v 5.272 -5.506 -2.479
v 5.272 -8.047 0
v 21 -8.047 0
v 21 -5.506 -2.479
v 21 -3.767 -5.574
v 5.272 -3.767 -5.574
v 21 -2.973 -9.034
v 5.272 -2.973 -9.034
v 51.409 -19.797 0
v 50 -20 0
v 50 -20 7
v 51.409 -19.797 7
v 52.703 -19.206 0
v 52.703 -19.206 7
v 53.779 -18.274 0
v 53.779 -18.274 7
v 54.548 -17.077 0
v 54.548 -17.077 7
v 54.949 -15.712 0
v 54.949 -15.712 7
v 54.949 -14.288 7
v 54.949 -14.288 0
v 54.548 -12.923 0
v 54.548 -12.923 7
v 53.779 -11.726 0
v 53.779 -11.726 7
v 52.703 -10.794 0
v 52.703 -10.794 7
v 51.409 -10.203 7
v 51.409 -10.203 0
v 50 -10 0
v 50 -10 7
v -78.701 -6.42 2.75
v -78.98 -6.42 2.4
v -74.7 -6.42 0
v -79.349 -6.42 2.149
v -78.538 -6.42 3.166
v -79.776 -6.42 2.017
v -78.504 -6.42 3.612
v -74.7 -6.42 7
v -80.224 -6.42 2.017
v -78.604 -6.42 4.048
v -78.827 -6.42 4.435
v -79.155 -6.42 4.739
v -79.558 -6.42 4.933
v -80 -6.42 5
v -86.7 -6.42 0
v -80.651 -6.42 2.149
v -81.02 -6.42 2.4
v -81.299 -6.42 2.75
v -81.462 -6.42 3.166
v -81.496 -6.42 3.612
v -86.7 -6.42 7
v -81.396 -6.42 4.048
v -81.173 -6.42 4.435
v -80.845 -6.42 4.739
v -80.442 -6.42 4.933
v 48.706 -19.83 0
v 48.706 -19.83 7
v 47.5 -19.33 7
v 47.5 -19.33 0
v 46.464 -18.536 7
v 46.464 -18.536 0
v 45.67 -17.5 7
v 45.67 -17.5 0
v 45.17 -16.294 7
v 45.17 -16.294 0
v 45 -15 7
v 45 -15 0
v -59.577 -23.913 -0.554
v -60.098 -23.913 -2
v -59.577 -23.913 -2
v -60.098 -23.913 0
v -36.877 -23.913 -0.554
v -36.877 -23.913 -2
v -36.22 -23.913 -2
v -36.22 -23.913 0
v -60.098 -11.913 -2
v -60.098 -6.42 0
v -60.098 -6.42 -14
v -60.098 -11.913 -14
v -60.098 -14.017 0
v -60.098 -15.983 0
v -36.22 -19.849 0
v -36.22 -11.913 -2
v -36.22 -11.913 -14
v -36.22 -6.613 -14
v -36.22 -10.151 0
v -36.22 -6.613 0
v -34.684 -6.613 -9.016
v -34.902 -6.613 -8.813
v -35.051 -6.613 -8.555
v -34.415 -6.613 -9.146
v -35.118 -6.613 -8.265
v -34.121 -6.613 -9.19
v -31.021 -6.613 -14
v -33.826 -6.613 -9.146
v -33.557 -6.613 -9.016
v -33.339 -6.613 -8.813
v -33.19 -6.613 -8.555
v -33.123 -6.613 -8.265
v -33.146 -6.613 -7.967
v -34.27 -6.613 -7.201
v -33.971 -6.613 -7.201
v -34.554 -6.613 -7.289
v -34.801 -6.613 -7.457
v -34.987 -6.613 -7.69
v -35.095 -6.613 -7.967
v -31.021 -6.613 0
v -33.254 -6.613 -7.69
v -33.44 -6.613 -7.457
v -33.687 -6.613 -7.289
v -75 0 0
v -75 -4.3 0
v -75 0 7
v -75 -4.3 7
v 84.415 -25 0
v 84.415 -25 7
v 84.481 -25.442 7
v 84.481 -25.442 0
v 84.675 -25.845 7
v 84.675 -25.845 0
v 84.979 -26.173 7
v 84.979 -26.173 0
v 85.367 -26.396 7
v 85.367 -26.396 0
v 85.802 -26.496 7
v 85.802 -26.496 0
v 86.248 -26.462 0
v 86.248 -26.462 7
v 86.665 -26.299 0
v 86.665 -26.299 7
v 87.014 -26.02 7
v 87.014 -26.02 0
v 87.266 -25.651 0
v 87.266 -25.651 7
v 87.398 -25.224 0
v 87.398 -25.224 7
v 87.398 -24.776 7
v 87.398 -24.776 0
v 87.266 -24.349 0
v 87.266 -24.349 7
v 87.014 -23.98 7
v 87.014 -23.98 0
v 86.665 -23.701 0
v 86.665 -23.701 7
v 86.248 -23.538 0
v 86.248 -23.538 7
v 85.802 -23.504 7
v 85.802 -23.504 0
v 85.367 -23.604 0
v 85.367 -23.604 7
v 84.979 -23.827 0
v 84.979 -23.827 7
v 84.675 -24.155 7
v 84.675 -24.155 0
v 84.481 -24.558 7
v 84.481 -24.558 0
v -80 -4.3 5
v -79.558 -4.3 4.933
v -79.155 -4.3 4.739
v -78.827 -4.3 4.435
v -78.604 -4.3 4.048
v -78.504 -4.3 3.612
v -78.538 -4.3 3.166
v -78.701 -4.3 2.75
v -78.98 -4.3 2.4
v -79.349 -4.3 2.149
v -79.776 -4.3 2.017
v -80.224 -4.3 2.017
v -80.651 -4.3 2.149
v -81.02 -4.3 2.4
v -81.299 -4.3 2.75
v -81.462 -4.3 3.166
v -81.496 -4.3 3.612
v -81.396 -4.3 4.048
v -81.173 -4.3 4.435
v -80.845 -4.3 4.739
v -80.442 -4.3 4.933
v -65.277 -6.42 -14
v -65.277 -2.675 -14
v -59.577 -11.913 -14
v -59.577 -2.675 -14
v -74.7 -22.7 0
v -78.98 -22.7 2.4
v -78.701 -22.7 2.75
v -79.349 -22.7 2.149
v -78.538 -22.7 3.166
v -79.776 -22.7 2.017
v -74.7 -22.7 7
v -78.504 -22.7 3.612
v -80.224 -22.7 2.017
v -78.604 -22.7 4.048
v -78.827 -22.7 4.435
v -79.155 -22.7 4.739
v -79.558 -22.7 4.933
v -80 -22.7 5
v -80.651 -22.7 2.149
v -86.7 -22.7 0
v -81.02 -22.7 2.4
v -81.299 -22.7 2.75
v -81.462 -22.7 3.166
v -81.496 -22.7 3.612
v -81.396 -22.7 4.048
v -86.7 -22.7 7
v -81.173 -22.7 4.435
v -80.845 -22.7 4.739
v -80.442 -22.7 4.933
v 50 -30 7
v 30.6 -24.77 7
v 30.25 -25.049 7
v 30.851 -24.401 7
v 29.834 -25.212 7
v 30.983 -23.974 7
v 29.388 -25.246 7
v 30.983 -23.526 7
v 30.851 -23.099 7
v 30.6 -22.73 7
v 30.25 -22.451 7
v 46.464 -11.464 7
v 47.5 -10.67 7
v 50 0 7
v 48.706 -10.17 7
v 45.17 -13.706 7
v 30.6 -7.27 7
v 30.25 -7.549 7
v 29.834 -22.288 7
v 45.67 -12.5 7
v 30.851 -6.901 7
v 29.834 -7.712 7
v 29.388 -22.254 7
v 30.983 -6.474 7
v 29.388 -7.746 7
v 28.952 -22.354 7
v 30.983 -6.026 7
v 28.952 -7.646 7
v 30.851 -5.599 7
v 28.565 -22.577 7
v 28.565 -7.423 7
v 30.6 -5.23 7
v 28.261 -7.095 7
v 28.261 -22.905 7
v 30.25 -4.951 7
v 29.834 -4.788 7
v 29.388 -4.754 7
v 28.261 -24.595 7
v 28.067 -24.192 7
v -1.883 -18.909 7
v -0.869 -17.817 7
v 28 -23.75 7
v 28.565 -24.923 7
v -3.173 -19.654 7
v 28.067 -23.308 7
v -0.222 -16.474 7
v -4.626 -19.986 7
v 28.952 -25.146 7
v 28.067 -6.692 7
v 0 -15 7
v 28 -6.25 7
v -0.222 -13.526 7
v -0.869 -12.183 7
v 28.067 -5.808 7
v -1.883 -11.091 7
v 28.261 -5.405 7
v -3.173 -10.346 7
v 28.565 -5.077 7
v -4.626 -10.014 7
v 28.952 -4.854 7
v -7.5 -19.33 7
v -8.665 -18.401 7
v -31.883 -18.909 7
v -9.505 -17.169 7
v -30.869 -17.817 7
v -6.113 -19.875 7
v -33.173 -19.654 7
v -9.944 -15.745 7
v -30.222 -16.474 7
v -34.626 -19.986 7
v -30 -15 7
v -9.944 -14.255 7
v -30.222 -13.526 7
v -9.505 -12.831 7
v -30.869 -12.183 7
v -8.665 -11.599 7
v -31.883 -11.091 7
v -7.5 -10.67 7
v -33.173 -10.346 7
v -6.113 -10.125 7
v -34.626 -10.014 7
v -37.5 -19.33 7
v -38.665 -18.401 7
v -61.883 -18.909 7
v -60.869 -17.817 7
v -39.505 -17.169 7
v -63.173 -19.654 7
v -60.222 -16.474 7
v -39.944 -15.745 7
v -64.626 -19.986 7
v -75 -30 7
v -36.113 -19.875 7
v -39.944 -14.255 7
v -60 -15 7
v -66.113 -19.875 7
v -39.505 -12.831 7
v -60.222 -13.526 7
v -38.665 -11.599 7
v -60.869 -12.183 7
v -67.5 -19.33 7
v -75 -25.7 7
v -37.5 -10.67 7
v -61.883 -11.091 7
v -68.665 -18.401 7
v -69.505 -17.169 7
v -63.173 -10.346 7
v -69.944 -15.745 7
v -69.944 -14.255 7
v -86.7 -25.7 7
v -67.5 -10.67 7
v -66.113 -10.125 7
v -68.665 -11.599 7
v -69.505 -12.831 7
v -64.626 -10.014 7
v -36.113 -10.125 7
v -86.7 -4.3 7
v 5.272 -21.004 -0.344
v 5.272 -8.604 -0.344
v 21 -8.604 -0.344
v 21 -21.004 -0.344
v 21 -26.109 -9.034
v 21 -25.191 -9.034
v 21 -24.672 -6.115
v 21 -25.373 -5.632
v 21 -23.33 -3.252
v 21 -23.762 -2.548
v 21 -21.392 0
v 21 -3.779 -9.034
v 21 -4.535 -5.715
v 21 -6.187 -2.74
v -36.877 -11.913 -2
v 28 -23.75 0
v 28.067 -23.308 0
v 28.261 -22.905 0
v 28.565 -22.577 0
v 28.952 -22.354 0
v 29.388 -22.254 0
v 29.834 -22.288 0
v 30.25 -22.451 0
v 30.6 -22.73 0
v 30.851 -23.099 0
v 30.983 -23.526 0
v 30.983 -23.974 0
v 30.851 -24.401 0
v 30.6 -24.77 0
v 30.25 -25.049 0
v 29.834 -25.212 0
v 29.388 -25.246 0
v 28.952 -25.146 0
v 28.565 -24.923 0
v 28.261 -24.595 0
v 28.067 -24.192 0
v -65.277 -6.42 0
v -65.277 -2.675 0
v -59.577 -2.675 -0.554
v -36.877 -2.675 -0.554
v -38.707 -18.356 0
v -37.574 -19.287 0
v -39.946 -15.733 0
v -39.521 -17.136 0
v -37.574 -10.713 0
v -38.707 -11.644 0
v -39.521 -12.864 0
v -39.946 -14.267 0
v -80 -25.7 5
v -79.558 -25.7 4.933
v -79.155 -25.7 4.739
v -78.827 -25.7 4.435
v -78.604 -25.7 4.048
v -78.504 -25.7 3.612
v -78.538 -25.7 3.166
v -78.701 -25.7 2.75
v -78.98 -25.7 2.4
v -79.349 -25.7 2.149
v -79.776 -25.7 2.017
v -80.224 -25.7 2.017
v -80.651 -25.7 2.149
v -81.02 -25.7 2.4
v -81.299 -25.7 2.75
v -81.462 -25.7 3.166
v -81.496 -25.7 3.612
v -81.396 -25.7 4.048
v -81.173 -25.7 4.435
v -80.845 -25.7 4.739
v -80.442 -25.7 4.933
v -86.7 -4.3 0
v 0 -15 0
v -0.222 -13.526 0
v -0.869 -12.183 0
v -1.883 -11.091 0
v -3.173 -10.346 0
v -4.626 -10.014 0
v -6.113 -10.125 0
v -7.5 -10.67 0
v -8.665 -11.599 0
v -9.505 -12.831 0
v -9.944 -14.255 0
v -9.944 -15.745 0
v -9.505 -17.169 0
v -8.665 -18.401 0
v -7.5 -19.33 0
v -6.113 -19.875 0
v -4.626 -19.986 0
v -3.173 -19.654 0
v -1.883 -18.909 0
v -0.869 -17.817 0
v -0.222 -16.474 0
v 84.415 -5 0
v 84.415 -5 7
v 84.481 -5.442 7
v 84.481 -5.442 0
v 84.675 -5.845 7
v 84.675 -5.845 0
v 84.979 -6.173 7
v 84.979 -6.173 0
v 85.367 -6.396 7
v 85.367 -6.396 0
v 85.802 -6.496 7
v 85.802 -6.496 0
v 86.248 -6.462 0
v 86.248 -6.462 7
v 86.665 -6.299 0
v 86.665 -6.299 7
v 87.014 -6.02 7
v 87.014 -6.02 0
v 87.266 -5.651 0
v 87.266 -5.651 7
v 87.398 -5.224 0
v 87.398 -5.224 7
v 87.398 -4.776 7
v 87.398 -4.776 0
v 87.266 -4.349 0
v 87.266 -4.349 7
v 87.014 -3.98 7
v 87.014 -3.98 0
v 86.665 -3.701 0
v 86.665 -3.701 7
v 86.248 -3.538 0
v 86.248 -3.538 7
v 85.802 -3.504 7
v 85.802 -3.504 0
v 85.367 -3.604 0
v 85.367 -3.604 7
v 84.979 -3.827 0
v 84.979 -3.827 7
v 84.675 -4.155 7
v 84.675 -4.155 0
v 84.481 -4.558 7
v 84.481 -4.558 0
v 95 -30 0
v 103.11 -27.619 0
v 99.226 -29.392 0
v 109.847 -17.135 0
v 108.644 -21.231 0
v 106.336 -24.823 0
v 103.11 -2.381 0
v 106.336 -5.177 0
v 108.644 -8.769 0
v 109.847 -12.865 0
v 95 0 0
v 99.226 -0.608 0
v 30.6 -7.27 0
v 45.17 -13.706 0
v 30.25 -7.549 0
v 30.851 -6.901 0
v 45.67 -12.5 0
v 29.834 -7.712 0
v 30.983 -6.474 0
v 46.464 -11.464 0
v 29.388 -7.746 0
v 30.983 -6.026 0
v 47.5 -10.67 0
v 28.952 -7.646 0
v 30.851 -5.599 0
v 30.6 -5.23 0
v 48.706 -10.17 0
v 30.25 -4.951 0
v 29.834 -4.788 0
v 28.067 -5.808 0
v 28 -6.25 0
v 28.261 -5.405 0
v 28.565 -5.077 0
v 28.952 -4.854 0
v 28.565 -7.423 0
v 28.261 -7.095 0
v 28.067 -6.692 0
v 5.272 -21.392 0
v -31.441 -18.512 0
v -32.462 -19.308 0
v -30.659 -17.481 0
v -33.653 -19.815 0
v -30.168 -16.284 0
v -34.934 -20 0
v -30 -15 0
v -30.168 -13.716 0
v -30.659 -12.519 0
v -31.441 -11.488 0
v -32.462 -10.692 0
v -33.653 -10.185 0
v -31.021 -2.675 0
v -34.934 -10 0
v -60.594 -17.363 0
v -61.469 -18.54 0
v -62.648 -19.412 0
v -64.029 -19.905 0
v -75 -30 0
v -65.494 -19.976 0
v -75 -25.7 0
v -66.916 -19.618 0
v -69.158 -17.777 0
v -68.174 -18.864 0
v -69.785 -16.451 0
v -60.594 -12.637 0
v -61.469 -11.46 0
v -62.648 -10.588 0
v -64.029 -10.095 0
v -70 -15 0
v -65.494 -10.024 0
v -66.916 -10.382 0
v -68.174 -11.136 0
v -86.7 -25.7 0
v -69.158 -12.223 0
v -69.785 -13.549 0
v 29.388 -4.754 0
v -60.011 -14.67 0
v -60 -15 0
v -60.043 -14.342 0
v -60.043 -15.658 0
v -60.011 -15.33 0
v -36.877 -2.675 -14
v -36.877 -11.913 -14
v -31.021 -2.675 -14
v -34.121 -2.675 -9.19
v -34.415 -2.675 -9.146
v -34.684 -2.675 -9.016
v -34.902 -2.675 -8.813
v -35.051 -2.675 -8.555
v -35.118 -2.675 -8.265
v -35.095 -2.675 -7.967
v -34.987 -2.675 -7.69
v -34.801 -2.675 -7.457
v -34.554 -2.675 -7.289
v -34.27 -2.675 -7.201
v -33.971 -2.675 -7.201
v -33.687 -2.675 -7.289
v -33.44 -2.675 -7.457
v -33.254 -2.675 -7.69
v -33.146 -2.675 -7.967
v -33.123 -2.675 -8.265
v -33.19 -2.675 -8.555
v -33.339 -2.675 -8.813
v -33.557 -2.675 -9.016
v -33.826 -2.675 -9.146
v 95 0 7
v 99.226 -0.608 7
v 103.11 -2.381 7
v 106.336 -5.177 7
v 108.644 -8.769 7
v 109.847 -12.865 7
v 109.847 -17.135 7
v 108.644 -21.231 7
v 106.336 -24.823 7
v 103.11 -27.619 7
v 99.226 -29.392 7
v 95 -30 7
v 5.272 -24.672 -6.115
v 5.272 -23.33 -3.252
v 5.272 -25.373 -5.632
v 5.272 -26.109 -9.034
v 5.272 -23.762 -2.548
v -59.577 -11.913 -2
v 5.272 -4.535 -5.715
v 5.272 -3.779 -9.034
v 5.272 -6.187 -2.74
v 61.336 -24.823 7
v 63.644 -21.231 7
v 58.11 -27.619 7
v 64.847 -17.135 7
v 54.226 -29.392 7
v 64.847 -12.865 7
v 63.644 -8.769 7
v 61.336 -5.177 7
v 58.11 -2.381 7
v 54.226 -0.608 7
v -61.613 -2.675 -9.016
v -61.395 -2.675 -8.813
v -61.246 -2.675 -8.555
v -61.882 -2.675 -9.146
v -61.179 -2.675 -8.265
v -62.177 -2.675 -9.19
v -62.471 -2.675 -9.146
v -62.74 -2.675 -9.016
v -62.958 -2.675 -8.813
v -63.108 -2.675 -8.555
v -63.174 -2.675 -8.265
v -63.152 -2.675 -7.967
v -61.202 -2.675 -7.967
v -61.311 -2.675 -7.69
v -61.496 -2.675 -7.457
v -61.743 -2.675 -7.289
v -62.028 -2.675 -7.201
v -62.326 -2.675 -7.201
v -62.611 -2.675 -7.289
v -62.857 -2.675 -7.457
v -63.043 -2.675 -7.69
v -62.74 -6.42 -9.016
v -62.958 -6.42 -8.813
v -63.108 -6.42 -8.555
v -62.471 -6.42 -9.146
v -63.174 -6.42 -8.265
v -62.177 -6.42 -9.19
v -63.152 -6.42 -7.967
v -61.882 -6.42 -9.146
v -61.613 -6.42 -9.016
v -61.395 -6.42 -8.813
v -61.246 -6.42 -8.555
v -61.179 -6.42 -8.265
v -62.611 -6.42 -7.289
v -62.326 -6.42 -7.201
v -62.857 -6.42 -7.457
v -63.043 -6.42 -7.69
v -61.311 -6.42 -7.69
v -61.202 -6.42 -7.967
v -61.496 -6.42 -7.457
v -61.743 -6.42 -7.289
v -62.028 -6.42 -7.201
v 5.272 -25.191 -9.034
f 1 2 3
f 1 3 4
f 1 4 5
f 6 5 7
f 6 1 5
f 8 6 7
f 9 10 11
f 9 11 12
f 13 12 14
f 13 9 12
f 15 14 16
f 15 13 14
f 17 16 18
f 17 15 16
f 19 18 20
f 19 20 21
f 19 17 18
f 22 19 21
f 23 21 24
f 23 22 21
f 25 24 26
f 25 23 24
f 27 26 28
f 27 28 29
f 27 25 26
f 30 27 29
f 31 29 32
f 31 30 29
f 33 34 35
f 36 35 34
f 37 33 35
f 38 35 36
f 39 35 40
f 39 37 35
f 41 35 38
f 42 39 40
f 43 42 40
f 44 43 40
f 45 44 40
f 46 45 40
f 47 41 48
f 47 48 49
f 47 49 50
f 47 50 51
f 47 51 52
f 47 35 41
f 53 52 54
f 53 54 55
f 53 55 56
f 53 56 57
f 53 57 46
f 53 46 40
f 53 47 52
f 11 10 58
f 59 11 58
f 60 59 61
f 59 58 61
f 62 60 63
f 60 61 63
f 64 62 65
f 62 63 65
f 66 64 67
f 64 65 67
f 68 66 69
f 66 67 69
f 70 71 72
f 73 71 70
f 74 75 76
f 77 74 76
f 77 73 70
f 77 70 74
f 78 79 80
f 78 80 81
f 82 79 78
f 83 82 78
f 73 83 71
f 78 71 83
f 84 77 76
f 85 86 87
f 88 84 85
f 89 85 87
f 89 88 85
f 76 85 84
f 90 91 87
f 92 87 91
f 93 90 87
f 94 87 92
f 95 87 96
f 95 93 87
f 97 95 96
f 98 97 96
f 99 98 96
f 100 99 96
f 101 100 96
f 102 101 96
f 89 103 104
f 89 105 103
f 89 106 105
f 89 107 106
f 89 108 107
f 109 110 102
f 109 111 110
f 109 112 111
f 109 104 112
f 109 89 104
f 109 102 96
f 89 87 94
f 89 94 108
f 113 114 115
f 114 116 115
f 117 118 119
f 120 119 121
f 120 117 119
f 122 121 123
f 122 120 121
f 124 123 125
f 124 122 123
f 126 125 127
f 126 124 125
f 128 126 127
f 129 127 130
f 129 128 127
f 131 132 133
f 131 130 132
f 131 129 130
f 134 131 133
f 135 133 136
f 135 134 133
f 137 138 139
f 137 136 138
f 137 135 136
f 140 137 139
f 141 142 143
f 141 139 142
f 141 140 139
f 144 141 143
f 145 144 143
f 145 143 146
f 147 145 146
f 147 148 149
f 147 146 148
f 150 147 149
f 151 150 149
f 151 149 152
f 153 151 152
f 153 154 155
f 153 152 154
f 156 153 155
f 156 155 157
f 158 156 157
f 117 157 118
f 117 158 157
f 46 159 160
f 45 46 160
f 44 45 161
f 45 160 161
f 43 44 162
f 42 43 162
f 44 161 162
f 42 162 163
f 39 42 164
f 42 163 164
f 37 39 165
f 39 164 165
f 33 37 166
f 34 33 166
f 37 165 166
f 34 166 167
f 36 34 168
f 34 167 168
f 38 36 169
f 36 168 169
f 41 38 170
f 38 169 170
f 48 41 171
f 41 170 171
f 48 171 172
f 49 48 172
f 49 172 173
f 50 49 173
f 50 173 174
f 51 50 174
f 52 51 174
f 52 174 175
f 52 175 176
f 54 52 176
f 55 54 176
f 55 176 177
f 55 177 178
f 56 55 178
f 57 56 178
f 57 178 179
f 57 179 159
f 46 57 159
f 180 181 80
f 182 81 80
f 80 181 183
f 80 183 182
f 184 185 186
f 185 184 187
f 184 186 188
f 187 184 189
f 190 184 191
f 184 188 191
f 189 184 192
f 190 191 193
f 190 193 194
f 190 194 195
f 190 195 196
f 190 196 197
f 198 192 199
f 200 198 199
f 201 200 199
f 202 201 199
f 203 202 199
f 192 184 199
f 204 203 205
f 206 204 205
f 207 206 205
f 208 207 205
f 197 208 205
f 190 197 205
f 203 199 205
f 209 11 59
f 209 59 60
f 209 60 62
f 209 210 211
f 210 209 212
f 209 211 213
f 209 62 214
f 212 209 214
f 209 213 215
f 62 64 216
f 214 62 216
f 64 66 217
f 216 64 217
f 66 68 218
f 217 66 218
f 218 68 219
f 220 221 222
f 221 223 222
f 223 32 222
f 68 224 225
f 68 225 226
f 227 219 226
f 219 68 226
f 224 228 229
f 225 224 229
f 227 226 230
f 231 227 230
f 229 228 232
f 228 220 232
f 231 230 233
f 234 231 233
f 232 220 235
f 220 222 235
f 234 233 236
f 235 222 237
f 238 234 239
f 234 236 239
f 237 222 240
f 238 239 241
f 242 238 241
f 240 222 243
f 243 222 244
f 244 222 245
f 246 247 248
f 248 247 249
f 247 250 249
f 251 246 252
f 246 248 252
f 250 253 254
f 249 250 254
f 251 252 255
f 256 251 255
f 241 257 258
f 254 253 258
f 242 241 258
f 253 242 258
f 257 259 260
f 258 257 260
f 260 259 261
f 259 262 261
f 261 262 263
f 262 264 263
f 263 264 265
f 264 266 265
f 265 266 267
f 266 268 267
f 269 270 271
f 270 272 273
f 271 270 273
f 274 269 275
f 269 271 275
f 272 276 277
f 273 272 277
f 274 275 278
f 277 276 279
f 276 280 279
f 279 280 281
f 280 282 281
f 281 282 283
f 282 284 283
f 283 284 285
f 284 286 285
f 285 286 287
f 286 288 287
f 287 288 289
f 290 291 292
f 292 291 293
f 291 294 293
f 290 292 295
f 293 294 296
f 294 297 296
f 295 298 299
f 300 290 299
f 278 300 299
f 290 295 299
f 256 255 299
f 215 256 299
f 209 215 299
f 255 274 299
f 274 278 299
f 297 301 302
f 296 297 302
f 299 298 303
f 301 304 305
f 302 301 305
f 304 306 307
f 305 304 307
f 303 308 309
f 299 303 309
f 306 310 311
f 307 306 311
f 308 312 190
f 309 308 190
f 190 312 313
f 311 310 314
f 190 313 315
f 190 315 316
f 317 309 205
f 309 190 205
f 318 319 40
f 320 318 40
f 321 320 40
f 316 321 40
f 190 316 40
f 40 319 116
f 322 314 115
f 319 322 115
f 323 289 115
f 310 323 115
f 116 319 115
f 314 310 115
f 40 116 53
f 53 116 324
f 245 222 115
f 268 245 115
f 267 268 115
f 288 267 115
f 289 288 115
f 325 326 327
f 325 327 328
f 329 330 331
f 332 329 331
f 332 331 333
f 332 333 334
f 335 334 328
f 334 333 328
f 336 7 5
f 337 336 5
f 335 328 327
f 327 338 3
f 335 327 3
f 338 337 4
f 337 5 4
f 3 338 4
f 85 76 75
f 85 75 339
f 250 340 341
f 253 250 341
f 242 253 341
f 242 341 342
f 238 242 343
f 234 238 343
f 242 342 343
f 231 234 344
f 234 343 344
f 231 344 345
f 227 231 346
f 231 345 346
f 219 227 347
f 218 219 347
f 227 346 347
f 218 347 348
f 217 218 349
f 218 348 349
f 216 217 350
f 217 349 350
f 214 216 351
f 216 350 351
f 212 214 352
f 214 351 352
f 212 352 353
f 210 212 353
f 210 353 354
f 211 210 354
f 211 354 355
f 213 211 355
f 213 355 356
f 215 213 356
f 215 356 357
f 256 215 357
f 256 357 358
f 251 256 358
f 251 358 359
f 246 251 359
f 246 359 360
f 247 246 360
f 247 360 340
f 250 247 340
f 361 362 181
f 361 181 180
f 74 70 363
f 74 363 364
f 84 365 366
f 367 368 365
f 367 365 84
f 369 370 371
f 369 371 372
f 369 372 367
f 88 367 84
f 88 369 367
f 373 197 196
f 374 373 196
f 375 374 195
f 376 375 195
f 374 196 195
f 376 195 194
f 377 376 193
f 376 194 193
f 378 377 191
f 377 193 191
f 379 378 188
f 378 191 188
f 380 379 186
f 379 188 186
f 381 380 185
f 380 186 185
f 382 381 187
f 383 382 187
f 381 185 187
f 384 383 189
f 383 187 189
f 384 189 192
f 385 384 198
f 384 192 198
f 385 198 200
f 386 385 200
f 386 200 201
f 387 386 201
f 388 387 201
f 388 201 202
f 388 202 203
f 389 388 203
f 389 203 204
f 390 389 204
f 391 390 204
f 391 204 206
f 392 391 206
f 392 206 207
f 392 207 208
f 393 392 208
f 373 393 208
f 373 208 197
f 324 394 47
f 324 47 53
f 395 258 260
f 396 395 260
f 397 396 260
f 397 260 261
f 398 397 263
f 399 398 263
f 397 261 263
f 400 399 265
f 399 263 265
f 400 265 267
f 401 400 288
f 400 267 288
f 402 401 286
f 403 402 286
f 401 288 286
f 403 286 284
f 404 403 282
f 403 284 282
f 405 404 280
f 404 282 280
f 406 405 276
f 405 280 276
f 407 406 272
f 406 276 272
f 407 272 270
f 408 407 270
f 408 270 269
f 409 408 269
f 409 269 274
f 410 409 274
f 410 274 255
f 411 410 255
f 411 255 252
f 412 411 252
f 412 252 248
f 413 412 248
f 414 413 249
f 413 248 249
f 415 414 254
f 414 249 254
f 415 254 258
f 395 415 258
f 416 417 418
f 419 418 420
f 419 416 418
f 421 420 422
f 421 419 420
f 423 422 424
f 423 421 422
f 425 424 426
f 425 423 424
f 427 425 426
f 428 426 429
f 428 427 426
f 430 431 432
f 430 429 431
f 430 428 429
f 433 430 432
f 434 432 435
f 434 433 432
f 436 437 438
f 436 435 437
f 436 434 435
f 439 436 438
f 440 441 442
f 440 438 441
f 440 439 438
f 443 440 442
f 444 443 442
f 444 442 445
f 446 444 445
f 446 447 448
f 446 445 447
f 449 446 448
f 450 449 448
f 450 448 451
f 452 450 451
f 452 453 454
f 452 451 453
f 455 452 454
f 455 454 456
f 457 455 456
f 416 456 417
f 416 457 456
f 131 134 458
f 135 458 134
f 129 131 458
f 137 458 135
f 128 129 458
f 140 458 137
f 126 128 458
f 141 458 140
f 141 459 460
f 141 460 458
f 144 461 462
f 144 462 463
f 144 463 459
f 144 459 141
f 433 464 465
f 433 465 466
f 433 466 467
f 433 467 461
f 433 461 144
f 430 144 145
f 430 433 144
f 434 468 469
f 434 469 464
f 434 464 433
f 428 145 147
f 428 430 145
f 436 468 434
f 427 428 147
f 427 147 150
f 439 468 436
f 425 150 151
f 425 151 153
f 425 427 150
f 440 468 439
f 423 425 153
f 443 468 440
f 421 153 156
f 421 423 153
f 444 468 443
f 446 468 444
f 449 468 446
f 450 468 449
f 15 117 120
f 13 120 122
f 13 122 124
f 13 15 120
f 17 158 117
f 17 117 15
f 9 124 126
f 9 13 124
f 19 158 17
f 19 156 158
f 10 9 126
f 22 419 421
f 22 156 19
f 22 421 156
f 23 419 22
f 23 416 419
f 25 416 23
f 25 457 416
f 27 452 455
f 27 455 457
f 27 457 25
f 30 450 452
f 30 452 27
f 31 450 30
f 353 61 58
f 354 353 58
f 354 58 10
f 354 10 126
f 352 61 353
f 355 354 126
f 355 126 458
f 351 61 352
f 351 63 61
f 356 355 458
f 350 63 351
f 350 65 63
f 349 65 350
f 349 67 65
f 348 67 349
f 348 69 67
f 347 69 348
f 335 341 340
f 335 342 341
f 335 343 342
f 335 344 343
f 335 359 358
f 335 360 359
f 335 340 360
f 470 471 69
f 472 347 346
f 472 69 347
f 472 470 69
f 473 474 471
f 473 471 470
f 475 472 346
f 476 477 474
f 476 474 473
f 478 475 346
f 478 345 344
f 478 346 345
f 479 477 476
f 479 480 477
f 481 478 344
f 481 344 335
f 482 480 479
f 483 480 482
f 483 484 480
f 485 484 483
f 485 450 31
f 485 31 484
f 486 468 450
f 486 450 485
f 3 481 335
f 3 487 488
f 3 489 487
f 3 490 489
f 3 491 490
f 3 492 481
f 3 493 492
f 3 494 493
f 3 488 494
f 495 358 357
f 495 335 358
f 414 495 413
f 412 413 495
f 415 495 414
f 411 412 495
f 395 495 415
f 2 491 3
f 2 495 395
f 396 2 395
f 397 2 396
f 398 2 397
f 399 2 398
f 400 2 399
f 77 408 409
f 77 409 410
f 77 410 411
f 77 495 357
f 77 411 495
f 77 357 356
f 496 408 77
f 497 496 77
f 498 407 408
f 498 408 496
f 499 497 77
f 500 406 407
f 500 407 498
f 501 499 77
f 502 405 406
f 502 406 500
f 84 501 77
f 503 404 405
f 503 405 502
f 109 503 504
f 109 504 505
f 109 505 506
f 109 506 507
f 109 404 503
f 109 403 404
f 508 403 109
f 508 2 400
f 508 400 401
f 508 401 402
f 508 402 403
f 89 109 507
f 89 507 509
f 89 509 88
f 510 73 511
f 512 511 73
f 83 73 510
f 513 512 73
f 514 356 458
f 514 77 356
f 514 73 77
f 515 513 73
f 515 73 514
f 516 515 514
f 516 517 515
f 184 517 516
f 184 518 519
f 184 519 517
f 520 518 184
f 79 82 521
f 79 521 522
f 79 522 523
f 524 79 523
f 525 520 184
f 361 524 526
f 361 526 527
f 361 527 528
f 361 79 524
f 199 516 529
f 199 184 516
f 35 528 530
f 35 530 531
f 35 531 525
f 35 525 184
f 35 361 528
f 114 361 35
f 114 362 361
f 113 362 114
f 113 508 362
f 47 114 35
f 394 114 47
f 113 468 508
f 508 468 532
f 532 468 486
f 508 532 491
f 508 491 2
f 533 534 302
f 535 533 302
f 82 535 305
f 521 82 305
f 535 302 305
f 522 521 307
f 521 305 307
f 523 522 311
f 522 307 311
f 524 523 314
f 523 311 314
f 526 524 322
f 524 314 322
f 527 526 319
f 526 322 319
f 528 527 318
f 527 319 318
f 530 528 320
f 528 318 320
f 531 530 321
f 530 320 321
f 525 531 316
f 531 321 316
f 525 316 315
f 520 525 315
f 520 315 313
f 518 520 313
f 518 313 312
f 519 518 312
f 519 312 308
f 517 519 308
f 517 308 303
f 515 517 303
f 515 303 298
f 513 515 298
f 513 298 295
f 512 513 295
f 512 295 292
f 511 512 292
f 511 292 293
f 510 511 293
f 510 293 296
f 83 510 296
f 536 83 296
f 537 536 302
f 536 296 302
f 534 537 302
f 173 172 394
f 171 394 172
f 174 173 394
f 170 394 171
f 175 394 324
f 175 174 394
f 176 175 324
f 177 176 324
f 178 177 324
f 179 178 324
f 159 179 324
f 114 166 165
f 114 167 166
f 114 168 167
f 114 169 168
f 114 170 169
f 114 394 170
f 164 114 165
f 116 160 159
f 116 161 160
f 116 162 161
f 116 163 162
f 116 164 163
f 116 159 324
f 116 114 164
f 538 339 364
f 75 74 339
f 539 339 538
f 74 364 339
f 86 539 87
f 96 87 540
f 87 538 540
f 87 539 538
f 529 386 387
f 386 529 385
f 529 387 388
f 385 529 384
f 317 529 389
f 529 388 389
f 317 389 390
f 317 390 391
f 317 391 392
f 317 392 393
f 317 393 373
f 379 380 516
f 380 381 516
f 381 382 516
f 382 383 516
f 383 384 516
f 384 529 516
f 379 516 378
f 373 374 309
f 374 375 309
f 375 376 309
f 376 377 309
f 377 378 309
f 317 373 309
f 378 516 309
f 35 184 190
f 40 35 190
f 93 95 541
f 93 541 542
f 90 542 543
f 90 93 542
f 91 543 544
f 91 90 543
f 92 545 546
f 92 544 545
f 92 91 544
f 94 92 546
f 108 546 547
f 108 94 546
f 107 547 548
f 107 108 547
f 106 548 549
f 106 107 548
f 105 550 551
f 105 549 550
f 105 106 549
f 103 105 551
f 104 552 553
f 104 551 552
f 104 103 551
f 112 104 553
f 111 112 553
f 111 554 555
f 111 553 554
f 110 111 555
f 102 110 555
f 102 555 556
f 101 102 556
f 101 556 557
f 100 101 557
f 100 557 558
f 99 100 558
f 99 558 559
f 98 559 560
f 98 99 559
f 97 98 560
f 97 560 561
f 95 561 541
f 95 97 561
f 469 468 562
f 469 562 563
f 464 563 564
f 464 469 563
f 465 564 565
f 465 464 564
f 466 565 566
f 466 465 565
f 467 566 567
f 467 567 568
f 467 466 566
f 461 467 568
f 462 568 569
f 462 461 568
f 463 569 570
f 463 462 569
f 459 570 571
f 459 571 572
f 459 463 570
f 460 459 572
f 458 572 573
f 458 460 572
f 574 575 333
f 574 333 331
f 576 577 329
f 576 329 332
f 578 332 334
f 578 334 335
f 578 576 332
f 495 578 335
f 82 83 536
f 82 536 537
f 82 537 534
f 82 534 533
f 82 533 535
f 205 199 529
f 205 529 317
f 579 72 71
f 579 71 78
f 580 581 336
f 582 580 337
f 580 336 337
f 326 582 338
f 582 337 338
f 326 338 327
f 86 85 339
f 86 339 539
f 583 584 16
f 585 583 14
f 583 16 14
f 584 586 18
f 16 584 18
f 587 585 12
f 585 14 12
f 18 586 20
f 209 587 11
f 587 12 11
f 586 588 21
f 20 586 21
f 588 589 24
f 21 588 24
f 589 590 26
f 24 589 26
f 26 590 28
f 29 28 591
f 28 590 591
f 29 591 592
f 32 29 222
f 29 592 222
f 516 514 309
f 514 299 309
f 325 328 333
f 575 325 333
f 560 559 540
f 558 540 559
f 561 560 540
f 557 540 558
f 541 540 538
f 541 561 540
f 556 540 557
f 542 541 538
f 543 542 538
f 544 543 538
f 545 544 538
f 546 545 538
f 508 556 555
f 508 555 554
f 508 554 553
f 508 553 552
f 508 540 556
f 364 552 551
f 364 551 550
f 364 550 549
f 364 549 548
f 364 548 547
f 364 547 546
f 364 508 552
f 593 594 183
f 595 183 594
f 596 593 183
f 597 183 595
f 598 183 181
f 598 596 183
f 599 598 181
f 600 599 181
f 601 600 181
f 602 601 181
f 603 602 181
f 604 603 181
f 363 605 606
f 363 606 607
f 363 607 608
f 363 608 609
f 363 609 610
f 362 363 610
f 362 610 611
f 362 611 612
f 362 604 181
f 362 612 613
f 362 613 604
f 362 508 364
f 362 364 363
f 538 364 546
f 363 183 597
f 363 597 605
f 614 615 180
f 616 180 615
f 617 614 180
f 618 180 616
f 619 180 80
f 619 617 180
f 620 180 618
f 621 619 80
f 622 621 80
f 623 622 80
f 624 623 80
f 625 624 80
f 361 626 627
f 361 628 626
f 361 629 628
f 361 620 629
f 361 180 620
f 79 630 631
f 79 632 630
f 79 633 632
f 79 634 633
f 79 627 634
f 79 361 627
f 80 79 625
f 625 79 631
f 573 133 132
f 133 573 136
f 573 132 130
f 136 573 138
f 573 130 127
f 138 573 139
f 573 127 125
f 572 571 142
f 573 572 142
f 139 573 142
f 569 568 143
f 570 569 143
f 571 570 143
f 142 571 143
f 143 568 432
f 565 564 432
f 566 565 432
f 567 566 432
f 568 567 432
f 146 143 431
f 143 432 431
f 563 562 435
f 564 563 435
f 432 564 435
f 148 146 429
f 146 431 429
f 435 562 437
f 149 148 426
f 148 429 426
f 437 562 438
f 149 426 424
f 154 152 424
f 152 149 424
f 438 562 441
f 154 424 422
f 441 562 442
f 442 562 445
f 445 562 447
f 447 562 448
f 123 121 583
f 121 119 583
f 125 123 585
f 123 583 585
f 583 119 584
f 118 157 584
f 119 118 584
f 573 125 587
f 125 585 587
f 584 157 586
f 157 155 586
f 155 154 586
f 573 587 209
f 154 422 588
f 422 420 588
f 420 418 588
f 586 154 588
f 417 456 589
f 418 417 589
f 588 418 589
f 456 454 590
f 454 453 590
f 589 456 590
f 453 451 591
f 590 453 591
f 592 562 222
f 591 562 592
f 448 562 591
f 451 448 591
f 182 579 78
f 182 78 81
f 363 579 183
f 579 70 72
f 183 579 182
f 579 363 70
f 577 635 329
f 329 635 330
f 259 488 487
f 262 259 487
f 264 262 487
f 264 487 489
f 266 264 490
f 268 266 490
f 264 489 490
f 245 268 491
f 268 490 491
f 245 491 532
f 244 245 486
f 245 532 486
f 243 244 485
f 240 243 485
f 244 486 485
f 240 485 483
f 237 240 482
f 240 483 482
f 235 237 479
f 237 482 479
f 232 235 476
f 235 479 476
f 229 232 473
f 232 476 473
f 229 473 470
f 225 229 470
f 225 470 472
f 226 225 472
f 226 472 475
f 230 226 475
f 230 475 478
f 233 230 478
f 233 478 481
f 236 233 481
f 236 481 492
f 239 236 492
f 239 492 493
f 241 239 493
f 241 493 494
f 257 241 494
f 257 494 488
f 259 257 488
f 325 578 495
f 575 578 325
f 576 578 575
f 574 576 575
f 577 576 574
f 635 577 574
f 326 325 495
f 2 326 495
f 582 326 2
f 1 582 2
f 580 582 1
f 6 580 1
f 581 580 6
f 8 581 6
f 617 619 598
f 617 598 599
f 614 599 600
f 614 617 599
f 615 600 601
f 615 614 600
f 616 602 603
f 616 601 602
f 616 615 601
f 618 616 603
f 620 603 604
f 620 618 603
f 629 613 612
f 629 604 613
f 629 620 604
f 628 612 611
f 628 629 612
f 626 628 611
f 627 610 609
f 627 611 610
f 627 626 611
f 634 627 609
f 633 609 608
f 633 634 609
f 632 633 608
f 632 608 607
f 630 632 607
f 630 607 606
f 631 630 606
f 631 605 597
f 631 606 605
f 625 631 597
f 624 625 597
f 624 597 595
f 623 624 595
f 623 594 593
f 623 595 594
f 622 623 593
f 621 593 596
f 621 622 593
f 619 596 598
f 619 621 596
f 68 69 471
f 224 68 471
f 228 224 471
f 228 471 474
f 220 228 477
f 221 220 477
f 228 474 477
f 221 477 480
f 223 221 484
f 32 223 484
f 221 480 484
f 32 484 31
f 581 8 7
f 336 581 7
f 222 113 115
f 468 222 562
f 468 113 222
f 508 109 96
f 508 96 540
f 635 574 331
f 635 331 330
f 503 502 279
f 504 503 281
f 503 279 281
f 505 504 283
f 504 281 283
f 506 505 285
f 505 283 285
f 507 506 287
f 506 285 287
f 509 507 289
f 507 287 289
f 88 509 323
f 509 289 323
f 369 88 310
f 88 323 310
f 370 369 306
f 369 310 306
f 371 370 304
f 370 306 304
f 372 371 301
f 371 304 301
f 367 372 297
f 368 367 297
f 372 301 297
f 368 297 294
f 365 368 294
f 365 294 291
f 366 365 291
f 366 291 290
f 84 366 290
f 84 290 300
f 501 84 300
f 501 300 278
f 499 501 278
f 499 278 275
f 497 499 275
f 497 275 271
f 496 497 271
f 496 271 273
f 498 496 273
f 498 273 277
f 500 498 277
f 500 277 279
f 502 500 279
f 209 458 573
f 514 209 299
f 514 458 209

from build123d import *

# Parameters (mm, degrees)
BOSS_EXTRUDE1_DEPTH      = 7
SKETCH2_R                = 5
CUT_EXTRUDE1_DEPTH       = 7
LPATTERN1_COUNT          = 7
LPATTERN1_PITCH          = 30
SKETCH6_R                = 5
CUT_EXTRUDE2_DEPTH       = 10
BOSS_EXTRUDE2_DEPTH      = 21
CUT_EXTRUDE3_DEPTH       = 21
CUT_EXTRUDE4_REACH       = 220.014
SKETCH9_R                = 1.5
CUT_EXTRUDE5_REACH       = 220.771
SKETCH10_W               = 5.271518542
SKETCH10_H               = 23.219312301
BOSS_EXTRUDE3_DEPTH      = 14
CUT_EXTRUDE6_DEPTH       = 1
CUT_EXTRUDE6_DEPTH_BACK  = 22
SKETCH12_W               = 22.7
SKETCH12_H               = 14.642587258
SKETCH12_H_2             = 12.3
CUT_EXTRUDE7_DEPTH       = 7
CUT_EXTRUDE7_DEPTH_BACK  = 7
SKETCH13_R               = 1
CUT_EXTRUDE8_REACH       = 184.393
SKETCH14_W               = 12
SKETCH14_H               = 12
CUT_EXTRUDE11_DEPTH      = 219.013742346
CUT_EXTRUDE11_DEPTH_BACK = 219.013742346
SKETCH16_W               = 140
SKETCH16_H               = 37.19308959
SKETCH17_W               = 7
SKETCH17_H               = 21.4
BOSS_EXTRUDE4_DEPTH      = 11.7
CUT_EXTRUDE12_REACH      = 94.641
SKETCH18_R               = 1.5
CUT_EXTRUDE13_REACH      = 95.925
SKETCH20_W               = 15.728481458
SKETCH20_H               = 11.090838969
SKETCH21_W               = 7
SKETCH21_H               = 16.279991403
CUT_EXTRUDE14_DEPTH      = 12
BOSS_EXTRUDE5_DEPTH      = 7
CUT_EXTRUDE15_DEPTH      = 116.935326799
CUT_EXTRUDE15_DEPTH_BACK = 7
SKETCH23_R               = 1.5


with BuildPart() as part:
    # Sketch1 → Boss-Extrude1 (new body)
    with BuildSketch(Plane.XY):
        with BuildLine():
            Line((-200, 0), (50, 0))
            ThreePointArc((50, 0), (65, -15), (50, -30))
            Line((50, -30), (-200, -30))
            ThreePointArc((-200, -30), (-215, -15), (-200, 0))
        make_face()
    extrude(amount=BOSS_EXTRUDE1_DEPTH)

    # Sketch2 → Cut-Extrude1 (cut)
    with BuildSketch(Plane.XY.offset(7)):
        with Locations((-185, -15)):
            Circle(SKETCH2_R)
    cut_extrude1 = extrude(amount=-CUT_EXTRUDE1_DEPTH, mode=Mode.SUBTRACT)

    # LPattern1: Cut-Extrude1 ×7
    with Locations(*[(i * LPATTERN1_PITCH, 0, 0) for i in range(1, LPATTERN1_COUNT)]):
        add(cut_extrude1, mode=Mode.SUBTRACT)

    # Sketch6 → Cut-Extrude2 (cut)
    with BuildSketch(Plane(origin=(0, 0, 0), x_dir=(-1, 0, 0), z_dir=(0, 0, -1))):
        with Locations((-50, -15)):
            Circle(SKETCH6_R)
    extrude(amount=-CUT_EXTRUDE2_DEPTH, mode=Mode.SUBTRACT)

    # Sketch7 → Boss-Extrude2 (add)
    with BuildSketch(Plane(origin=(0, 0, 0), x_dir=(0, 0, -1), z_dir=(1, 0, 0))):
        with BuildLine():
            Line((20.124409349, -8.046570755), (20.124409349, -21.391782887))
            ThreePointArc((20.124409349, -21.391782887), (10.062204675, -26.149434806), (0, -21.391782887))
            Line((0, -21.391782887), (0, -8.046570755))
            ThreePointArc((0, -8.046570755), (10.062204675, -2.930122505), (20.124409349, -8.046570755))
        make_face()
    extrude(amount=BOSS_EXTRUDE2_DEPTH)

    # Sketch8 → Cut-Extrude3 (cut)
    with BuildSketch(Plane(origin=(21, 0, 0), x_dir=(0, 0, -1), z_dir=(1, 0, 0))):
        with BuildLine():
            Line((0.343653188, -8.603738845), (0.343653188, -21.003738845))
            Line((0.343653188, -21.003738845), (3.251608919, -23.33010343))
            Line((3.251608919, -23.33010343), (6.11482687, -24.672236845))
            Line((6.11482687, -24.672236845), (10.141227113, -25.388041332))
            Line((10.141227113, -25.388041332), (14.122889575, -24.672236845))
            Line((14.122889575, -24.672236845), (17.165058648, -23.33010343))
            Line((17.165058648, -23.33010343), (19.670374355, -20.953281344))
            Line((19.670374355, -20.953281344), (19.670374355, -8.553281344))
            ThreePointArc((19.670374355, -8.553281344), (9.994377841, -3.738573545), (0.343653188, -8.603738845))
        make_face()
    extrude(amount=-CUT_EXTRUDE3_DEPTH, mode=Mode.SUBTRACT)

    # Sketch9 → Cut-Extrude4 (cut, up to next)
    with BuildSketch(Plane(origin=(0, 0, 0), x_dir=(-1, 0, 0), z_dir=(0, 0, -1)), mode=Mode.PRIVATE) as cut_extrude4_sk1:
        with Locations((-29.5, -6.25)):
            Circle(SKETCH9_R)
    cut_extrude4_tool1 = extrude(cut_extrude4_sk1.sketch, amount=-CUT_EXTRUDE4_REACH, mode=Mode.PRIVATE) & part.part
    # Sketch9 → Cut-Extrude4 (cut, up to next)
    with BuildSketch(Plane(origin=(0, 0, 0), x_dir=(-1, 0, 0), z_dir=(0, 0, -1)), mode=Mode.PRIVATE) as cut_extrude4_sk2:
        with Locations((-29.5, -23.75)):
            Circle(SKETCH9_R)
    cut_extrude4_tool2 = extrude(cut_extrude4_sk2.sketch, amount=-CUT_EXTRUDE4_REACH, mode=Mode.PRIVATE) & part.part
    add(cut_extrude4_tool1.solids().sort_by_distance((29.5, -6.25, 0))[0], mode=Mode.SUBTRACT)
    add(cut_extrude4_tool2.solids().sort_by_distance((29.5, -23.75, 0))[0], mode=Mode.SUBTRACT)

    # Cut-Extrude5: up to this face of the body (flat: up to its plane)
    cut_extrude5_end = Plane(part.part.faces().sort_by_distance((-78.33059512, -15.01080435, 0))[0])
    # Sketch10 → Cut-Extrude5 (cut, up to the picked face)
    with BuildSketch(Plane(origin=(0, 0, -20.124409349), x_dir=(-1, 0, 0), z_dir=(0, 0, -1)), mode=Mode.PRIVATE) as cut_extrude5_sk1:
        with Locations((-2.635759271, -14.539778656)):
            Rectangle(SKETCH10_W, SKETCH10_H)
    cut_extrude5_tool1 = split(extrude(cut_extrude5_sk1.sketch, amount=-CUT_EXTRUDE5_REACH, mode=Mode.PRIVATE), bisect_by=cut_extrude5_end, keep=Keep.BOTH, mode=Mode.PRIVATE)
    add(cut_extrude5_tool1.solids().sort_by(Axis((2.635759, -14.539779, -20.124409), (0, 0, 1)))[0], mode=Mode.SUBTRACT)

    # Sketch11 → Boss-Extrude3 (add)
    with BuildSketch(Plane(origin=(0, 0, 0), x_dir=(-1, 0, 0), z_dir=(0, 0, -1))):
        Polygon((60.097644306, -6.420008597), (60.097644306, -23.913431972), (36.21993437, -23.913431972), (36.21993437, -6.613282571), (31.020509523, -6.613282571), (31.020509523, -2.674883318), (65.276628567, -2.674883318), (65.276628567, -6.420008597), align=None)
        Polygon((193.975354243, -6.285954501), (193.975354243, -16.540829221), (170.097644306, -16.540829221), (170.097644306, -6.479228475), (164.898219459, -6.479228475), (164.898219459, -2.540829221), (199.154338504, -2.540829221), (199.154338504, -6.285954501), align=None)
    extrude(amount=BOSS_EXTRUDE3_DEPTH)

    # Sketch12 → Cut-Extrude6 (cut, two sides: drawn at the far end of the back side and taken through both)
    with BuildSketch(Plane(origin=(0, -2.674883318, 0), x_dir=(1, 0, 0), z_dir=(0, 1, 0)).offset(-CUT_EXTRUDE6_DEPTH_BACK)):
        with Locations((-48.226628567, 7.87504546)):
            Rectangle(SKETCH12_W, SKETCH12_H)
        with Locations((-182.104338504, 6.42306456)):
            Rectangle(SKETCH12_W, SKETCH12_H_2)
    extrude(amount=CUT_EXTRUDE6_DEPTH + CUT_EXTRUDE6_DEPTH_BACK, mode=Mode.SUBTRACT)

    # Sketch13 → Cut-Extrude7 (cut, two sides: drawn at the far end of the back side and taken through both)
    with BuildSketch(Plane(origin=(0, -2.674883318, 0), x_dir=(1, 0, 0), z_dir=(0, 1, 0)).offset(-CUT_EXTRUDE7_DEPTH_BACK)):
        with Locations(Location((-167.998219459, 8.19, 0), (0, 0, 90))):
            Circle(SKETCH13_R)
        with Locations(Location((-196.054338504, 8.19, 0), (0, 0, 90))):
            Circle(SKETCH13_R)
        with Locations(Location((-62.176628567, 8.19, 0), (0, 0, 90))):
            Circle(SKETCH13_R)
        with Locations(Location((-34.120509523, 8.19, 0), (0, 0, 90))):
            Circle(SKETCH13_R)
    extrude(amount=CUT_EXTRUDE7_DEPTH + CUT_EXTRUDE7_DEPTH_BACK, mode=Mode.SUBTRACT)

    # Cut-Extrude8: up to this face of the body (flat: up to its plane)
    cut_extrude8_end = Plane(part.part.faces().sort_by_distance((-193.975354243, -11.413391861, -7))[0])
    # Sketch14 → Cut-Extrude8 (cut, up to the picked face)
    with BuildSketch(Plane(origin=(-36.21993437, 0, 0), x_dir=(0, 0, -1), z_dir=(1, 0, 0)), mode=Mode.PRIVATE) as cut_extrude8_sk1:
        with Locations((8, -17.913431972)):
            Rectangle(SKETCH14_W, SKETCH14_H)
    cut_extrude8_tool1 = split(extrude(cut_extrude8_sk1.sketch, amount=-CUT_EXTRUDE8_REACH, mode=Mode.PRIVATE), bisect_by=cut_extrude8_end, keep=Keep.BOTH, mode=Mode.PRIVATE)
    add(cut_extrude8_tool1.solids().sort_by(Axis((-36.219934, -17.913432, -8), (-1, 0, 0)))[0], mode=Mode.SUBTRACT)

    # Sketch16 → Cut-Extrude11 (cut, two sides: drawn at the far end of the back side and taken through both)
    with BuildSketch(Plane(origin=(0, 0, 0), x_dir=(-1, 0, 0), z_dir=(0, 0, -1)).offset(-CUT_EXTRUDE11_DEPTH_BACK)):
        with Locations((145, -15.740579032)):
            Rectangle(SKETCH16_W, SKETCH16_H)
    extrude(amount=CUT_EXTRUDE11_DEPTH + CUT_EXTRUDE11_DEPTH_BACK, mode=Mode.SUBTRACT)

    # Sketch17 → Boss-Extrude4 (add)
    with BuildSketch(Plane.ZY.offset(75)):
        with Locations((3.5, -15)):
            Rectangle(SKETCH17_W, SKETCH17_H)
    extrude(amount=BOSS_EXTRUDE4_DEPTH)

    # Sketch18 → Cut-Extrude12 (cut, up to next)
    with BuildSketch(Plane(origin=(0, -4.3, 0), x_dir=(1, 0, 0), z_dir=(0, 1, 0)), mode=Mode.PRIVATE) as cut_extrude12_sk1:
        with Locations(Location((-80, -3.5, 0), (0, 0, 270))):
            Circle(SKETCH18_R)
    cut_extrude12_tool1 = extrude(cut_extrude12_sk1.sketch, amount=-CUT_EXTRUDE12_REACH, mode=Mode.PRIVATE) & part.part
    add(cut_extrude12_tool1.solids().sort_by_distance((-80, -4.3, 3.5))[0], mode=Mode.SUBTRACT)

    # Sketch20 → Cut-Extrude13 (cut, up to next)
    with BuildSketch(Plane(origin=(0, 0, 0), x_dir=(1, 0, 0), z_dir=(0, 1, 0)), mode=Mode.PRIVATE) as cut_extrude13_sk1:
        with Locations((13.135759271, 14.578989865)):
            Rectangle(SKETCH20_W, SKETCH20_H)
    cut_extrude13_tool1 = extrude(cut_extrude13_sk1.sketch, amount=-CUT_EXTRUDE13_REACH, mode=Mode.PRIVATE) & part.part
    add(cut_extrude13_tool1.solids().sort_by_distance((13.135759, 0, -14.57899))[0], mode=Mode.SUBTRACT)

    # Sketch21 → Cut-Extrude14 (cut)
    with BuildSketch(Plane.ZY.offset(86.7)):
        with Locations((3.5, -14.560004299)):
            Rectangle(SKETCH21_W, SKETCH21_H)
    extrude(amount=-CUT_EXTRUDE14_DEPTH, mode=Mode.SUBTRACT)

    # Sketch22 → Boss-Extrude5 (add)
    with BuildSketch(Plane(origin=(0, 0, 0), x_dir=(-1, 0, 0), z_dir=(0, 0, -1))):
        with BuildLine():
            ThreePointArc((-50, -20), (-55, -15), (-50, -10))
            Line((-50, -10), (-50, 0))
            Line((-50, 0), (-95, 0))
            ThreePointArc((-95, 0), (-110, -15), (-95, -30))
            Line((-95, -30), (-50, -30))
            Line((-50, -30), (-50, -20))
        make_face()
    extrude(amount=-BOSS_EXTRUDE5_DEPTH)

    # Sketch23 → Cut-Extrude15 (cut, two sides: drawn at the far end of the back side and taken through both)
    with BuildSketch(Plane.XY.offset(7).offset(-CUT_EXTRUDE15_DEPTH_BACK)):
        with Locations(Location((85.914550285, -25, 0), (0, 0, 180))):
            Circle(SKETCH23_R)
        with Locations(Location((85.914550285, -5, 0), (0, 0, 180))):
            Circle(SKETCH23_R)
    extrude(amount=CUT_EXTRUDE15_DEPTH + CUT_EXTRUDE15_DEPTH_BACK, mode=Mode.SUBTRACT)


solid = part.part
